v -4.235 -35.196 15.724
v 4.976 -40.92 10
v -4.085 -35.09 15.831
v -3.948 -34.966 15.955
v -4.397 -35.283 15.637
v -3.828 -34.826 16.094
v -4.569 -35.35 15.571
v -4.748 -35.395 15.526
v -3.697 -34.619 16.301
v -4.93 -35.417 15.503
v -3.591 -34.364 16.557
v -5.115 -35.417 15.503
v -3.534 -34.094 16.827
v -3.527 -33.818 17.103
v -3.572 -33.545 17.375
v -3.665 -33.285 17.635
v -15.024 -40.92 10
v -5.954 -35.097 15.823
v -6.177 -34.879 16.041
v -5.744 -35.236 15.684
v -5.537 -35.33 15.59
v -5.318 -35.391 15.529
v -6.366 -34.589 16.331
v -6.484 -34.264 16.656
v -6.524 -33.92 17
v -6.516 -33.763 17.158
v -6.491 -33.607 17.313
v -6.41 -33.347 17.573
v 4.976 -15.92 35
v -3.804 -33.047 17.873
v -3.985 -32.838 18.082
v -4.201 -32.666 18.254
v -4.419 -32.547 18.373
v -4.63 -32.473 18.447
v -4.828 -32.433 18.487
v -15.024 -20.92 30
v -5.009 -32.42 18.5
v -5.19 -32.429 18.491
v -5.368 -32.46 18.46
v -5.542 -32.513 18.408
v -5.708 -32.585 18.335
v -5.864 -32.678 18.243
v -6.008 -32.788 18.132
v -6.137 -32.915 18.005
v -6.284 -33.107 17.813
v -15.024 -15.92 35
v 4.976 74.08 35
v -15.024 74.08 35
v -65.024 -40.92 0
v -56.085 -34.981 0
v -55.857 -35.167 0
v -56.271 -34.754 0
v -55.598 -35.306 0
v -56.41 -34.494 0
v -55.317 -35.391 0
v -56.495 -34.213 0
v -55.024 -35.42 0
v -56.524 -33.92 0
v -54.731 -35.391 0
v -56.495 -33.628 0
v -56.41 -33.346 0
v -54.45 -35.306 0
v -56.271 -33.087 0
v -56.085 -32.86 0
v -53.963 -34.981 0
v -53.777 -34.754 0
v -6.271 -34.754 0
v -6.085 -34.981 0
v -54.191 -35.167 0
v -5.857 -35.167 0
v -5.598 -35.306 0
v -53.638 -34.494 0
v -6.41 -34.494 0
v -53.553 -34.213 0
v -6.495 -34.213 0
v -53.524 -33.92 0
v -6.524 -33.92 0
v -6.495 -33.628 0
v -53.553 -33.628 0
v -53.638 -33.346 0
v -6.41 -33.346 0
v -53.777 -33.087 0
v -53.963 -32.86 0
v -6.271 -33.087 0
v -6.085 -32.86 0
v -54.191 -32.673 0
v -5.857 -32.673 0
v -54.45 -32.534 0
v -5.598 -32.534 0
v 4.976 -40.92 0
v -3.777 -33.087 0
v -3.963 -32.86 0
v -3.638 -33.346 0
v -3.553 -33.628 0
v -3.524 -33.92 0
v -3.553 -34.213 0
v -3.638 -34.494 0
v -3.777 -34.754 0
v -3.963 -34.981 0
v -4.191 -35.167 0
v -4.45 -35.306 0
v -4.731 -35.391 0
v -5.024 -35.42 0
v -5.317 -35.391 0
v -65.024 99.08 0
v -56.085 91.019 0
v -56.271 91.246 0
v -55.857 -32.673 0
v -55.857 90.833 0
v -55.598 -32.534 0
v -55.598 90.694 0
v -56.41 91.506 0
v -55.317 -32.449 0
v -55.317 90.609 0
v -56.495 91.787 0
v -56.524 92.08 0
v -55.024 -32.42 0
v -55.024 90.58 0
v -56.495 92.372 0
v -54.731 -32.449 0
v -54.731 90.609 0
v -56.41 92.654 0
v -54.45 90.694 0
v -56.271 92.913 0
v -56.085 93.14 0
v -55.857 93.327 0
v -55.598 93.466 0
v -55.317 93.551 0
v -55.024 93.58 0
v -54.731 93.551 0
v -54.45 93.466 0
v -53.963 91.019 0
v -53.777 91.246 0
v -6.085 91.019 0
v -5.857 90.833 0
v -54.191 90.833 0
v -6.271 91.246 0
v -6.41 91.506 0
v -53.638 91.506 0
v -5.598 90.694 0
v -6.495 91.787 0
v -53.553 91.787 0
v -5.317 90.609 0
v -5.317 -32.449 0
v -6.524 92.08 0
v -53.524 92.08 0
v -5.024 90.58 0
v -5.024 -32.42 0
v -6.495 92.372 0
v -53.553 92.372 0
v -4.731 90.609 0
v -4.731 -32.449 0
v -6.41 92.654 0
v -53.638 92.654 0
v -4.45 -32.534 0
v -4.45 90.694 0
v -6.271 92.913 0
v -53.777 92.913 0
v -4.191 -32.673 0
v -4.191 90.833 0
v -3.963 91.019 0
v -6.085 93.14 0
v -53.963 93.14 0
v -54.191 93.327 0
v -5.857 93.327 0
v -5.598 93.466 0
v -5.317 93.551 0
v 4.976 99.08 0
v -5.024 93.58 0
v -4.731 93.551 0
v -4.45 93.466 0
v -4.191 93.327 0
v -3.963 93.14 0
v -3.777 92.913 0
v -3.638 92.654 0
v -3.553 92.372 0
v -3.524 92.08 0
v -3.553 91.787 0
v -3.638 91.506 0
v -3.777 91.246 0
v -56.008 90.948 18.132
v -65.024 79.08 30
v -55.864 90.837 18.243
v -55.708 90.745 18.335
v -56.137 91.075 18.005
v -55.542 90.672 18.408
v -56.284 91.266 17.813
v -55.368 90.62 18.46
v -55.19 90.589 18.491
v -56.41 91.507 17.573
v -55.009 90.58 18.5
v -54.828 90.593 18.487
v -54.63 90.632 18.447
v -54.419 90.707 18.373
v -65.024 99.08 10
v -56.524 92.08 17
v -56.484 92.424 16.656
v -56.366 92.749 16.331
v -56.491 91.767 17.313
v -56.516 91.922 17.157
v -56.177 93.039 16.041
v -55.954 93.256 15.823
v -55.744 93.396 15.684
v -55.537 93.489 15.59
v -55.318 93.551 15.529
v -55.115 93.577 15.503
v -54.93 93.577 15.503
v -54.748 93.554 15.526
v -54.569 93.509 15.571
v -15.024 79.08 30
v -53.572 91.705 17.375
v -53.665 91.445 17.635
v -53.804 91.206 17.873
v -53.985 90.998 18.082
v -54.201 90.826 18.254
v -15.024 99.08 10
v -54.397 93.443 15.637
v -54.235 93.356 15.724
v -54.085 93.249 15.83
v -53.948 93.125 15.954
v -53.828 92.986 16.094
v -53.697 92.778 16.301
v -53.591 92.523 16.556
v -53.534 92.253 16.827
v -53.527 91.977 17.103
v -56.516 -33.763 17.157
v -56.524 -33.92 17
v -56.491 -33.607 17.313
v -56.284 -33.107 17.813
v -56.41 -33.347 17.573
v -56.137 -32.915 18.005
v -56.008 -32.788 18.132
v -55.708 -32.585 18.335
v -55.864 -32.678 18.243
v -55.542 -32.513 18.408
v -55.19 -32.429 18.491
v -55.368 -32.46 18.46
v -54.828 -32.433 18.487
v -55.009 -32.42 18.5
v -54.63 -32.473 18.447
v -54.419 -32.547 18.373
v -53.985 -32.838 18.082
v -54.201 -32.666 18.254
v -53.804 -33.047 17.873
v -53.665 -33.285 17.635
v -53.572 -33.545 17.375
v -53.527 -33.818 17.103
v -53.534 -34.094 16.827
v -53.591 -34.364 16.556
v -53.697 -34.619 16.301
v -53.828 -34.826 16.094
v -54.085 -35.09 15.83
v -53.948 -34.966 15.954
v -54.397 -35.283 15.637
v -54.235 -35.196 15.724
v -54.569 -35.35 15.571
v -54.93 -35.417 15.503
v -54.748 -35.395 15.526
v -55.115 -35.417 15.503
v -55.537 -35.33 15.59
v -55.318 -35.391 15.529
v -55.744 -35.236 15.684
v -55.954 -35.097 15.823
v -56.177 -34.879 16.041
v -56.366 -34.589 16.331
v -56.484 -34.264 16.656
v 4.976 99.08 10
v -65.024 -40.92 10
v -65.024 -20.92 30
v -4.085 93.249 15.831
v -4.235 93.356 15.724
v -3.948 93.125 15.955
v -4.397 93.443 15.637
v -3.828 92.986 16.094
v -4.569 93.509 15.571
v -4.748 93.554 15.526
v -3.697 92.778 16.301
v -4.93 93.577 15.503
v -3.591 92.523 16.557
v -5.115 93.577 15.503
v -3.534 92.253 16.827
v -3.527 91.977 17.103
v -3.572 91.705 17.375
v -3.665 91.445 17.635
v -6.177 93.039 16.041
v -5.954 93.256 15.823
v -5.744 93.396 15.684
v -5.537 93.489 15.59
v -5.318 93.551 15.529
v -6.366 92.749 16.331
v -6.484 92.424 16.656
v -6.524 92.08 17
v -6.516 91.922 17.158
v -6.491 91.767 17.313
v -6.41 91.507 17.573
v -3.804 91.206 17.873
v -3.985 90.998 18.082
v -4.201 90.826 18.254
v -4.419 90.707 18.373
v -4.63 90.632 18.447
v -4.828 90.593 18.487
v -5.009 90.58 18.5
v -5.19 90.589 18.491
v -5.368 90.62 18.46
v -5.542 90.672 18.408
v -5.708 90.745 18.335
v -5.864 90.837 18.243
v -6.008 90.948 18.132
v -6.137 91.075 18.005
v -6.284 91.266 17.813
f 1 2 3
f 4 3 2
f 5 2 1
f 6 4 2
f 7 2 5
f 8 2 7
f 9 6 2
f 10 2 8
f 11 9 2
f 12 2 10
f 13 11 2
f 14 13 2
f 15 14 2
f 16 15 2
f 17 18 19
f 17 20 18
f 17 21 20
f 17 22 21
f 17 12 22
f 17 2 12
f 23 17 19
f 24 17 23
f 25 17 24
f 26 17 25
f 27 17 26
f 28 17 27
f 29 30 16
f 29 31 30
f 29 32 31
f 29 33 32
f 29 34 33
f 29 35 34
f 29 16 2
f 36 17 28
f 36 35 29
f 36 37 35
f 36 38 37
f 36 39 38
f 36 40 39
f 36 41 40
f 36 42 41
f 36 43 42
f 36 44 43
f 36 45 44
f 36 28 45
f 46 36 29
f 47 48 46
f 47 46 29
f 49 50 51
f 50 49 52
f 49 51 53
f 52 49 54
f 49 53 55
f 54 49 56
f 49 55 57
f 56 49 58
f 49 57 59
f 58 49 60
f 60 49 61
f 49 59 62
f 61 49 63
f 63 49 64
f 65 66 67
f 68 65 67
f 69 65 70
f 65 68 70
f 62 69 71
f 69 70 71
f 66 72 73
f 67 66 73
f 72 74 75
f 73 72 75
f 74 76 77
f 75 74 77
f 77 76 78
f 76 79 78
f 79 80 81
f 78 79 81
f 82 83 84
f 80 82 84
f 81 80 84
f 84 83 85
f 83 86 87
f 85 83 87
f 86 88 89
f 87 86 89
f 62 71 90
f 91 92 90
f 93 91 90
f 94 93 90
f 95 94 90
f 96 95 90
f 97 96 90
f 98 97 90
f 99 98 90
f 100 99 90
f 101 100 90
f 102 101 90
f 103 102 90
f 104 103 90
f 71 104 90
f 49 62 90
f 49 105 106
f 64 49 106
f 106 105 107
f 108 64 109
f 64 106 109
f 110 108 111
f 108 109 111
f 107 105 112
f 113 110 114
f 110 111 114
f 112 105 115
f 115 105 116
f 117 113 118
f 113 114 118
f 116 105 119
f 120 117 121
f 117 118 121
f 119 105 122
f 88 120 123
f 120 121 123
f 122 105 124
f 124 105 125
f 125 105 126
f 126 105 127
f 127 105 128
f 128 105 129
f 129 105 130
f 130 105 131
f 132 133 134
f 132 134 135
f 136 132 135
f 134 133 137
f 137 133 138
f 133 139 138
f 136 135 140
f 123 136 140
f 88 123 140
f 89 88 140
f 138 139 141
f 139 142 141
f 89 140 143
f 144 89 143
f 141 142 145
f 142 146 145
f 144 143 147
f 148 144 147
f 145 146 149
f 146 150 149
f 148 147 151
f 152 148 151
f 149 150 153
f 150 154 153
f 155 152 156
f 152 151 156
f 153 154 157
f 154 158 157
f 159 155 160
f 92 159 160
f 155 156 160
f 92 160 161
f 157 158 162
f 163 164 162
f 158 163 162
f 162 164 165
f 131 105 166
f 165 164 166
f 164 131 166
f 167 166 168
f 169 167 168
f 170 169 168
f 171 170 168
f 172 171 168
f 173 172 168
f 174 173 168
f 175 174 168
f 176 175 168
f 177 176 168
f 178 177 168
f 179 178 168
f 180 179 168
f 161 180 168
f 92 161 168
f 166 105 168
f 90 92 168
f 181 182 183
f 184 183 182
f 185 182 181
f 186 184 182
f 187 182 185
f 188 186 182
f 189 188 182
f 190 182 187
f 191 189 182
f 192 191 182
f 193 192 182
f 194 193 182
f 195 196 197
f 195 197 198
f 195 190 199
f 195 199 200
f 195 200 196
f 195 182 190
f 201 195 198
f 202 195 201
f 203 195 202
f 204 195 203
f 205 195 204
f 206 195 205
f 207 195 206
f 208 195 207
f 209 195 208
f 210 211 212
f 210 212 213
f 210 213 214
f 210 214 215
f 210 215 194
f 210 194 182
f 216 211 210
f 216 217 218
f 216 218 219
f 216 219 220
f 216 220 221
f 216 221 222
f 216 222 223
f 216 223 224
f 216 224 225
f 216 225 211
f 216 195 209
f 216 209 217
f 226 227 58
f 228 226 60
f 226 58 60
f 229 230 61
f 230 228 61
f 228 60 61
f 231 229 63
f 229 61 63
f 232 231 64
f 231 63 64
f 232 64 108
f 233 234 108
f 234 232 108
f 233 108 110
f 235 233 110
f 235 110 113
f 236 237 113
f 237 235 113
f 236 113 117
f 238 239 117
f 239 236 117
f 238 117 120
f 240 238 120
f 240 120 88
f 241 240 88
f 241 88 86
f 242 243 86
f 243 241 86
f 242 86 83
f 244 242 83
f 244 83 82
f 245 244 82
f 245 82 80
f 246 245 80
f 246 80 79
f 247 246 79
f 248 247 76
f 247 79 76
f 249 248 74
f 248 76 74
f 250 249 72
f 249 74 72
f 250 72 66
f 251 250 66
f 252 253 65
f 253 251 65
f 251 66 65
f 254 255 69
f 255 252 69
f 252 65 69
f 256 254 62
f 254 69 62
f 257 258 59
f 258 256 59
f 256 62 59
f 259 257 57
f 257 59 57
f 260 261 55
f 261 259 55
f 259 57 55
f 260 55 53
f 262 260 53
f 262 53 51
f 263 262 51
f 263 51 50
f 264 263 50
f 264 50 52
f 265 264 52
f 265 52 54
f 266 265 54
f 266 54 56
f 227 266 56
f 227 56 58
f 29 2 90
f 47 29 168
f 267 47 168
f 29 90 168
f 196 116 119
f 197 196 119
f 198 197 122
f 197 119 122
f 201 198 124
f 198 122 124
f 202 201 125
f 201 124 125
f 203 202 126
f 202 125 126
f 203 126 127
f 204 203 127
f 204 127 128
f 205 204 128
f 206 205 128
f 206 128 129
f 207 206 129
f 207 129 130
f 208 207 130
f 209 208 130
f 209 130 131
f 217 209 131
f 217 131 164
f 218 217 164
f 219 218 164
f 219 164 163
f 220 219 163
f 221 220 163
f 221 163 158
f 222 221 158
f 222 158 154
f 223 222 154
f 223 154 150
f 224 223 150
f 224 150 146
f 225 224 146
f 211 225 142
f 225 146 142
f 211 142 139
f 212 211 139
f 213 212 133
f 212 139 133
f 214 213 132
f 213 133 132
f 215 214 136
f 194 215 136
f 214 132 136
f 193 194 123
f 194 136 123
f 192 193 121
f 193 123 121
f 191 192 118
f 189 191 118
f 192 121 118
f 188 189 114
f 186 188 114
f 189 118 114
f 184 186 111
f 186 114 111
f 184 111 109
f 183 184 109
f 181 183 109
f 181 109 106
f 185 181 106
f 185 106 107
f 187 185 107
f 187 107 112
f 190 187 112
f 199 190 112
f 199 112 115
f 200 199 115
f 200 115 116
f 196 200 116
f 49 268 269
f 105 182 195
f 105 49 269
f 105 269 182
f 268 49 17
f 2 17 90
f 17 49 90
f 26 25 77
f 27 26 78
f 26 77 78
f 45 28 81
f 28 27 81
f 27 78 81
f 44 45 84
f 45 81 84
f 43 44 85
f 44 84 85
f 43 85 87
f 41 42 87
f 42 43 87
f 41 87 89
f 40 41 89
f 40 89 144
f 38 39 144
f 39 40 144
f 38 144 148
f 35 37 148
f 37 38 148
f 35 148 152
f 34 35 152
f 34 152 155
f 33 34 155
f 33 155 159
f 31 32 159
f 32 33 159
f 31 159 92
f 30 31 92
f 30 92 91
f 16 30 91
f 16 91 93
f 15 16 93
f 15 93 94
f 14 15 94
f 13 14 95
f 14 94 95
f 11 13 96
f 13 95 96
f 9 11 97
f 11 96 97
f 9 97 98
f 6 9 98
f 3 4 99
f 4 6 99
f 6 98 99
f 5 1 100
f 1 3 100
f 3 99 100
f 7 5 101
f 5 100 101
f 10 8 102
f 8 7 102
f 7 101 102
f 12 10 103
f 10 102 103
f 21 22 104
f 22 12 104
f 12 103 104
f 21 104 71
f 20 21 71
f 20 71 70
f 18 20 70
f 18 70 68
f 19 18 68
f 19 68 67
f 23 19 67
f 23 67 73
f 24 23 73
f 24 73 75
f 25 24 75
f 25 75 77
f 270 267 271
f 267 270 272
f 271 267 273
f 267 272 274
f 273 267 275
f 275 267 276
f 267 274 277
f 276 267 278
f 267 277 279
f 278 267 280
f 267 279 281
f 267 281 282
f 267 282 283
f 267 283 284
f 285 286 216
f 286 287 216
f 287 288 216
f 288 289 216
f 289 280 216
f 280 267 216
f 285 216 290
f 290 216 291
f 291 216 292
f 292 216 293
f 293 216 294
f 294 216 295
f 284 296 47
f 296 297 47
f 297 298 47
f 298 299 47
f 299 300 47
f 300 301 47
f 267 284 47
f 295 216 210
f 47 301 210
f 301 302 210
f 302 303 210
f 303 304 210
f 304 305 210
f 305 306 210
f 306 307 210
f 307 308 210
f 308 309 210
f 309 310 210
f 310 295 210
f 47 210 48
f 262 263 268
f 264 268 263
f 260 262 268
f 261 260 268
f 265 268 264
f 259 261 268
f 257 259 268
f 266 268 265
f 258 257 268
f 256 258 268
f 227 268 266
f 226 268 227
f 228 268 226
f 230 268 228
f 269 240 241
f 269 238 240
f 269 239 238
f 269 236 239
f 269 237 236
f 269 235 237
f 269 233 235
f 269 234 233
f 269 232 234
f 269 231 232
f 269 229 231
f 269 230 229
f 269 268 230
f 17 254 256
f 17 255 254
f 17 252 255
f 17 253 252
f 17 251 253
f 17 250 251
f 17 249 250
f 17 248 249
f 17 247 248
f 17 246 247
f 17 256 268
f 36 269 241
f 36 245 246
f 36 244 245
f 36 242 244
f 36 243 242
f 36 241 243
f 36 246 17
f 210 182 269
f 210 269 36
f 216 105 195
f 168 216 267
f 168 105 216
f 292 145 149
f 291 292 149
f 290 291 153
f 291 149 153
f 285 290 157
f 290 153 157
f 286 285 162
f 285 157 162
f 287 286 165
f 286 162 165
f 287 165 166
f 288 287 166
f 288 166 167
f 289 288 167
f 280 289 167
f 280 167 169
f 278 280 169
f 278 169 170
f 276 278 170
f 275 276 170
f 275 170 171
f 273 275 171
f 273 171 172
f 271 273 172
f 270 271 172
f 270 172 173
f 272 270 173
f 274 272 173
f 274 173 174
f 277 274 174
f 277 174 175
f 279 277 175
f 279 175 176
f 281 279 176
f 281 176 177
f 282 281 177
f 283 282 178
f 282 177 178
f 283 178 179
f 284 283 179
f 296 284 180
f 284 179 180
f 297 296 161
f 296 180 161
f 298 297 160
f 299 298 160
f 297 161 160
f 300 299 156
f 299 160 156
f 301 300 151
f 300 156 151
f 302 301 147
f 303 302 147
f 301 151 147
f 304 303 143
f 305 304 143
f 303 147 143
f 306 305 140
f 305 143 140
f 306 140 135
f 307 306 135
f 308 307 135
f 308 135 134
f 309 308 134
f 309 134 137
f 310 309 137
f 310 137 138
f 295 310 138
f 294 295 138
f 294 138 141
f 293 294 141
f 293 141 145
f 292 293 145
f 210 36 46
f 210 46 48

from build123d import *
from build123d.topology import SkipClean

# Parameters (mm, degrees)
SKETCH_1_W          = 70
SKETCH_1_H          = 140
EXTRUDE_1_DEPTH     = 10
SKETCH_2_W          = 50
SKETCH_2_H          = 100
EXTRUDE_2_DEPTH     = 20
CHAMFER_2_SIZE      = 20
CHAMFER_3_SIZE      = 20
SKETCH_3_W          = 20
SKETCH_3_H          = 140
EXTRUDE_3_DEPTH     = 25
CUT_EXTRUDE_1_DEPTH = 25
SKETCH_5_R          = 1.5
CUT_EXTRUDE_2_DEPTH = 25


with BuildPart() as part:
    # 草图1 → 凸台-拉伸1 (new body)
    with BuildSketch(Plane.XY):
        with Locations((-30.02391207, 29.079779473)):
            Rectangle(SKETCH_1_W, SKETCH_1_H)
    extrude(amount=EXTRUDE_1_DEPTH)

    # 草图2 → 凸台-拉伸2 (add)
    with BuildSketch(Plane.XY.offset(10)):
        with Locations((-40.02391207, 29.079779473)):
            Rectangle(SKETCH_2_W, SKETCH_2_H)
    extrude(amount=EXTRUDE_2_DEPTH)

    # 倒角2
    chamfer_2_edges = [part.edges().sort_by_distance(p)[0] for p in [
        (-40.02391207, -20.920220527, 10),
    ]]
    chamfer(chamfer_2_edges, length=CHAMFER_2_SIZE - 0.0001)  # a hair under: the kernel refuses the full size

    # 倒角3
    chamfer_3_edges = [part.edges().sort_by_distance(p)[0] for p in [
        (-40.02391207, 79.079779473, 10),
    ]]
    chamfer(chamfer_3_edges, length=CHAMFER_3_SIZE - 0.0001)  # a hair under: the kernel refuses the full size

    # 草图3 → 凸台-拉伸3 (add)
    with BuildSketch(Plane.XY.offset(10)):
        with Locations((-5.02391207, 29.079779473)):
            Rectangle(SKETCH_3_W, SKETCH_3_H)
    extrude(amount=EXTRUDE_3_DEPTH)

    # 草图4 → 切除-拉伸1 (cut)
    with SkipClean():  # the faces are left unmerged after this step: merging them gives an invalid solid
        with BuildSketch(Plane.ZY.offset(15.02391207)):
            Polygon((10, -40.920220527), (42.065793191, -8.854427336), (42.065793191, -55.280550519), align=None)
            Polygon((10, 99.079779473), (42.065793191, 67.013986282), (50.963251555, 103.923082266), align=None)
        extrude(amount=-CUT_EXTRUDE_1_DEPTH, mode=Mode.SUBTRACT)

    # 草图5 → 切除-拉伸2 (cut)
    with SkipClean():  # the faces are left unmerged after this step: merging them gives an invalid solid
        with BuildSketch(Plane(origin=(0, 0, 0), x_dir=(-1, 0, 0), z_dir=(0, 0, -1))):
            with Locations((5.02391207, 92.079779473)):
                Circle(SKETCH_5_R)
            with Locations((55.02391207, 92.079779473)):
                Circle(SKETCH_5_R)
            with Locations((5.02391207, -33.920220527)):
                Circle(SKETCH_5_R)
            with Locations((55.02391207, -33.920220527)):
                Circle(SKETCH_5_R)
        extrude(amount=-CUT_EXTRUDE_2_DEPTH, mode=Mode.SUBTRACT)


solid = part.part
